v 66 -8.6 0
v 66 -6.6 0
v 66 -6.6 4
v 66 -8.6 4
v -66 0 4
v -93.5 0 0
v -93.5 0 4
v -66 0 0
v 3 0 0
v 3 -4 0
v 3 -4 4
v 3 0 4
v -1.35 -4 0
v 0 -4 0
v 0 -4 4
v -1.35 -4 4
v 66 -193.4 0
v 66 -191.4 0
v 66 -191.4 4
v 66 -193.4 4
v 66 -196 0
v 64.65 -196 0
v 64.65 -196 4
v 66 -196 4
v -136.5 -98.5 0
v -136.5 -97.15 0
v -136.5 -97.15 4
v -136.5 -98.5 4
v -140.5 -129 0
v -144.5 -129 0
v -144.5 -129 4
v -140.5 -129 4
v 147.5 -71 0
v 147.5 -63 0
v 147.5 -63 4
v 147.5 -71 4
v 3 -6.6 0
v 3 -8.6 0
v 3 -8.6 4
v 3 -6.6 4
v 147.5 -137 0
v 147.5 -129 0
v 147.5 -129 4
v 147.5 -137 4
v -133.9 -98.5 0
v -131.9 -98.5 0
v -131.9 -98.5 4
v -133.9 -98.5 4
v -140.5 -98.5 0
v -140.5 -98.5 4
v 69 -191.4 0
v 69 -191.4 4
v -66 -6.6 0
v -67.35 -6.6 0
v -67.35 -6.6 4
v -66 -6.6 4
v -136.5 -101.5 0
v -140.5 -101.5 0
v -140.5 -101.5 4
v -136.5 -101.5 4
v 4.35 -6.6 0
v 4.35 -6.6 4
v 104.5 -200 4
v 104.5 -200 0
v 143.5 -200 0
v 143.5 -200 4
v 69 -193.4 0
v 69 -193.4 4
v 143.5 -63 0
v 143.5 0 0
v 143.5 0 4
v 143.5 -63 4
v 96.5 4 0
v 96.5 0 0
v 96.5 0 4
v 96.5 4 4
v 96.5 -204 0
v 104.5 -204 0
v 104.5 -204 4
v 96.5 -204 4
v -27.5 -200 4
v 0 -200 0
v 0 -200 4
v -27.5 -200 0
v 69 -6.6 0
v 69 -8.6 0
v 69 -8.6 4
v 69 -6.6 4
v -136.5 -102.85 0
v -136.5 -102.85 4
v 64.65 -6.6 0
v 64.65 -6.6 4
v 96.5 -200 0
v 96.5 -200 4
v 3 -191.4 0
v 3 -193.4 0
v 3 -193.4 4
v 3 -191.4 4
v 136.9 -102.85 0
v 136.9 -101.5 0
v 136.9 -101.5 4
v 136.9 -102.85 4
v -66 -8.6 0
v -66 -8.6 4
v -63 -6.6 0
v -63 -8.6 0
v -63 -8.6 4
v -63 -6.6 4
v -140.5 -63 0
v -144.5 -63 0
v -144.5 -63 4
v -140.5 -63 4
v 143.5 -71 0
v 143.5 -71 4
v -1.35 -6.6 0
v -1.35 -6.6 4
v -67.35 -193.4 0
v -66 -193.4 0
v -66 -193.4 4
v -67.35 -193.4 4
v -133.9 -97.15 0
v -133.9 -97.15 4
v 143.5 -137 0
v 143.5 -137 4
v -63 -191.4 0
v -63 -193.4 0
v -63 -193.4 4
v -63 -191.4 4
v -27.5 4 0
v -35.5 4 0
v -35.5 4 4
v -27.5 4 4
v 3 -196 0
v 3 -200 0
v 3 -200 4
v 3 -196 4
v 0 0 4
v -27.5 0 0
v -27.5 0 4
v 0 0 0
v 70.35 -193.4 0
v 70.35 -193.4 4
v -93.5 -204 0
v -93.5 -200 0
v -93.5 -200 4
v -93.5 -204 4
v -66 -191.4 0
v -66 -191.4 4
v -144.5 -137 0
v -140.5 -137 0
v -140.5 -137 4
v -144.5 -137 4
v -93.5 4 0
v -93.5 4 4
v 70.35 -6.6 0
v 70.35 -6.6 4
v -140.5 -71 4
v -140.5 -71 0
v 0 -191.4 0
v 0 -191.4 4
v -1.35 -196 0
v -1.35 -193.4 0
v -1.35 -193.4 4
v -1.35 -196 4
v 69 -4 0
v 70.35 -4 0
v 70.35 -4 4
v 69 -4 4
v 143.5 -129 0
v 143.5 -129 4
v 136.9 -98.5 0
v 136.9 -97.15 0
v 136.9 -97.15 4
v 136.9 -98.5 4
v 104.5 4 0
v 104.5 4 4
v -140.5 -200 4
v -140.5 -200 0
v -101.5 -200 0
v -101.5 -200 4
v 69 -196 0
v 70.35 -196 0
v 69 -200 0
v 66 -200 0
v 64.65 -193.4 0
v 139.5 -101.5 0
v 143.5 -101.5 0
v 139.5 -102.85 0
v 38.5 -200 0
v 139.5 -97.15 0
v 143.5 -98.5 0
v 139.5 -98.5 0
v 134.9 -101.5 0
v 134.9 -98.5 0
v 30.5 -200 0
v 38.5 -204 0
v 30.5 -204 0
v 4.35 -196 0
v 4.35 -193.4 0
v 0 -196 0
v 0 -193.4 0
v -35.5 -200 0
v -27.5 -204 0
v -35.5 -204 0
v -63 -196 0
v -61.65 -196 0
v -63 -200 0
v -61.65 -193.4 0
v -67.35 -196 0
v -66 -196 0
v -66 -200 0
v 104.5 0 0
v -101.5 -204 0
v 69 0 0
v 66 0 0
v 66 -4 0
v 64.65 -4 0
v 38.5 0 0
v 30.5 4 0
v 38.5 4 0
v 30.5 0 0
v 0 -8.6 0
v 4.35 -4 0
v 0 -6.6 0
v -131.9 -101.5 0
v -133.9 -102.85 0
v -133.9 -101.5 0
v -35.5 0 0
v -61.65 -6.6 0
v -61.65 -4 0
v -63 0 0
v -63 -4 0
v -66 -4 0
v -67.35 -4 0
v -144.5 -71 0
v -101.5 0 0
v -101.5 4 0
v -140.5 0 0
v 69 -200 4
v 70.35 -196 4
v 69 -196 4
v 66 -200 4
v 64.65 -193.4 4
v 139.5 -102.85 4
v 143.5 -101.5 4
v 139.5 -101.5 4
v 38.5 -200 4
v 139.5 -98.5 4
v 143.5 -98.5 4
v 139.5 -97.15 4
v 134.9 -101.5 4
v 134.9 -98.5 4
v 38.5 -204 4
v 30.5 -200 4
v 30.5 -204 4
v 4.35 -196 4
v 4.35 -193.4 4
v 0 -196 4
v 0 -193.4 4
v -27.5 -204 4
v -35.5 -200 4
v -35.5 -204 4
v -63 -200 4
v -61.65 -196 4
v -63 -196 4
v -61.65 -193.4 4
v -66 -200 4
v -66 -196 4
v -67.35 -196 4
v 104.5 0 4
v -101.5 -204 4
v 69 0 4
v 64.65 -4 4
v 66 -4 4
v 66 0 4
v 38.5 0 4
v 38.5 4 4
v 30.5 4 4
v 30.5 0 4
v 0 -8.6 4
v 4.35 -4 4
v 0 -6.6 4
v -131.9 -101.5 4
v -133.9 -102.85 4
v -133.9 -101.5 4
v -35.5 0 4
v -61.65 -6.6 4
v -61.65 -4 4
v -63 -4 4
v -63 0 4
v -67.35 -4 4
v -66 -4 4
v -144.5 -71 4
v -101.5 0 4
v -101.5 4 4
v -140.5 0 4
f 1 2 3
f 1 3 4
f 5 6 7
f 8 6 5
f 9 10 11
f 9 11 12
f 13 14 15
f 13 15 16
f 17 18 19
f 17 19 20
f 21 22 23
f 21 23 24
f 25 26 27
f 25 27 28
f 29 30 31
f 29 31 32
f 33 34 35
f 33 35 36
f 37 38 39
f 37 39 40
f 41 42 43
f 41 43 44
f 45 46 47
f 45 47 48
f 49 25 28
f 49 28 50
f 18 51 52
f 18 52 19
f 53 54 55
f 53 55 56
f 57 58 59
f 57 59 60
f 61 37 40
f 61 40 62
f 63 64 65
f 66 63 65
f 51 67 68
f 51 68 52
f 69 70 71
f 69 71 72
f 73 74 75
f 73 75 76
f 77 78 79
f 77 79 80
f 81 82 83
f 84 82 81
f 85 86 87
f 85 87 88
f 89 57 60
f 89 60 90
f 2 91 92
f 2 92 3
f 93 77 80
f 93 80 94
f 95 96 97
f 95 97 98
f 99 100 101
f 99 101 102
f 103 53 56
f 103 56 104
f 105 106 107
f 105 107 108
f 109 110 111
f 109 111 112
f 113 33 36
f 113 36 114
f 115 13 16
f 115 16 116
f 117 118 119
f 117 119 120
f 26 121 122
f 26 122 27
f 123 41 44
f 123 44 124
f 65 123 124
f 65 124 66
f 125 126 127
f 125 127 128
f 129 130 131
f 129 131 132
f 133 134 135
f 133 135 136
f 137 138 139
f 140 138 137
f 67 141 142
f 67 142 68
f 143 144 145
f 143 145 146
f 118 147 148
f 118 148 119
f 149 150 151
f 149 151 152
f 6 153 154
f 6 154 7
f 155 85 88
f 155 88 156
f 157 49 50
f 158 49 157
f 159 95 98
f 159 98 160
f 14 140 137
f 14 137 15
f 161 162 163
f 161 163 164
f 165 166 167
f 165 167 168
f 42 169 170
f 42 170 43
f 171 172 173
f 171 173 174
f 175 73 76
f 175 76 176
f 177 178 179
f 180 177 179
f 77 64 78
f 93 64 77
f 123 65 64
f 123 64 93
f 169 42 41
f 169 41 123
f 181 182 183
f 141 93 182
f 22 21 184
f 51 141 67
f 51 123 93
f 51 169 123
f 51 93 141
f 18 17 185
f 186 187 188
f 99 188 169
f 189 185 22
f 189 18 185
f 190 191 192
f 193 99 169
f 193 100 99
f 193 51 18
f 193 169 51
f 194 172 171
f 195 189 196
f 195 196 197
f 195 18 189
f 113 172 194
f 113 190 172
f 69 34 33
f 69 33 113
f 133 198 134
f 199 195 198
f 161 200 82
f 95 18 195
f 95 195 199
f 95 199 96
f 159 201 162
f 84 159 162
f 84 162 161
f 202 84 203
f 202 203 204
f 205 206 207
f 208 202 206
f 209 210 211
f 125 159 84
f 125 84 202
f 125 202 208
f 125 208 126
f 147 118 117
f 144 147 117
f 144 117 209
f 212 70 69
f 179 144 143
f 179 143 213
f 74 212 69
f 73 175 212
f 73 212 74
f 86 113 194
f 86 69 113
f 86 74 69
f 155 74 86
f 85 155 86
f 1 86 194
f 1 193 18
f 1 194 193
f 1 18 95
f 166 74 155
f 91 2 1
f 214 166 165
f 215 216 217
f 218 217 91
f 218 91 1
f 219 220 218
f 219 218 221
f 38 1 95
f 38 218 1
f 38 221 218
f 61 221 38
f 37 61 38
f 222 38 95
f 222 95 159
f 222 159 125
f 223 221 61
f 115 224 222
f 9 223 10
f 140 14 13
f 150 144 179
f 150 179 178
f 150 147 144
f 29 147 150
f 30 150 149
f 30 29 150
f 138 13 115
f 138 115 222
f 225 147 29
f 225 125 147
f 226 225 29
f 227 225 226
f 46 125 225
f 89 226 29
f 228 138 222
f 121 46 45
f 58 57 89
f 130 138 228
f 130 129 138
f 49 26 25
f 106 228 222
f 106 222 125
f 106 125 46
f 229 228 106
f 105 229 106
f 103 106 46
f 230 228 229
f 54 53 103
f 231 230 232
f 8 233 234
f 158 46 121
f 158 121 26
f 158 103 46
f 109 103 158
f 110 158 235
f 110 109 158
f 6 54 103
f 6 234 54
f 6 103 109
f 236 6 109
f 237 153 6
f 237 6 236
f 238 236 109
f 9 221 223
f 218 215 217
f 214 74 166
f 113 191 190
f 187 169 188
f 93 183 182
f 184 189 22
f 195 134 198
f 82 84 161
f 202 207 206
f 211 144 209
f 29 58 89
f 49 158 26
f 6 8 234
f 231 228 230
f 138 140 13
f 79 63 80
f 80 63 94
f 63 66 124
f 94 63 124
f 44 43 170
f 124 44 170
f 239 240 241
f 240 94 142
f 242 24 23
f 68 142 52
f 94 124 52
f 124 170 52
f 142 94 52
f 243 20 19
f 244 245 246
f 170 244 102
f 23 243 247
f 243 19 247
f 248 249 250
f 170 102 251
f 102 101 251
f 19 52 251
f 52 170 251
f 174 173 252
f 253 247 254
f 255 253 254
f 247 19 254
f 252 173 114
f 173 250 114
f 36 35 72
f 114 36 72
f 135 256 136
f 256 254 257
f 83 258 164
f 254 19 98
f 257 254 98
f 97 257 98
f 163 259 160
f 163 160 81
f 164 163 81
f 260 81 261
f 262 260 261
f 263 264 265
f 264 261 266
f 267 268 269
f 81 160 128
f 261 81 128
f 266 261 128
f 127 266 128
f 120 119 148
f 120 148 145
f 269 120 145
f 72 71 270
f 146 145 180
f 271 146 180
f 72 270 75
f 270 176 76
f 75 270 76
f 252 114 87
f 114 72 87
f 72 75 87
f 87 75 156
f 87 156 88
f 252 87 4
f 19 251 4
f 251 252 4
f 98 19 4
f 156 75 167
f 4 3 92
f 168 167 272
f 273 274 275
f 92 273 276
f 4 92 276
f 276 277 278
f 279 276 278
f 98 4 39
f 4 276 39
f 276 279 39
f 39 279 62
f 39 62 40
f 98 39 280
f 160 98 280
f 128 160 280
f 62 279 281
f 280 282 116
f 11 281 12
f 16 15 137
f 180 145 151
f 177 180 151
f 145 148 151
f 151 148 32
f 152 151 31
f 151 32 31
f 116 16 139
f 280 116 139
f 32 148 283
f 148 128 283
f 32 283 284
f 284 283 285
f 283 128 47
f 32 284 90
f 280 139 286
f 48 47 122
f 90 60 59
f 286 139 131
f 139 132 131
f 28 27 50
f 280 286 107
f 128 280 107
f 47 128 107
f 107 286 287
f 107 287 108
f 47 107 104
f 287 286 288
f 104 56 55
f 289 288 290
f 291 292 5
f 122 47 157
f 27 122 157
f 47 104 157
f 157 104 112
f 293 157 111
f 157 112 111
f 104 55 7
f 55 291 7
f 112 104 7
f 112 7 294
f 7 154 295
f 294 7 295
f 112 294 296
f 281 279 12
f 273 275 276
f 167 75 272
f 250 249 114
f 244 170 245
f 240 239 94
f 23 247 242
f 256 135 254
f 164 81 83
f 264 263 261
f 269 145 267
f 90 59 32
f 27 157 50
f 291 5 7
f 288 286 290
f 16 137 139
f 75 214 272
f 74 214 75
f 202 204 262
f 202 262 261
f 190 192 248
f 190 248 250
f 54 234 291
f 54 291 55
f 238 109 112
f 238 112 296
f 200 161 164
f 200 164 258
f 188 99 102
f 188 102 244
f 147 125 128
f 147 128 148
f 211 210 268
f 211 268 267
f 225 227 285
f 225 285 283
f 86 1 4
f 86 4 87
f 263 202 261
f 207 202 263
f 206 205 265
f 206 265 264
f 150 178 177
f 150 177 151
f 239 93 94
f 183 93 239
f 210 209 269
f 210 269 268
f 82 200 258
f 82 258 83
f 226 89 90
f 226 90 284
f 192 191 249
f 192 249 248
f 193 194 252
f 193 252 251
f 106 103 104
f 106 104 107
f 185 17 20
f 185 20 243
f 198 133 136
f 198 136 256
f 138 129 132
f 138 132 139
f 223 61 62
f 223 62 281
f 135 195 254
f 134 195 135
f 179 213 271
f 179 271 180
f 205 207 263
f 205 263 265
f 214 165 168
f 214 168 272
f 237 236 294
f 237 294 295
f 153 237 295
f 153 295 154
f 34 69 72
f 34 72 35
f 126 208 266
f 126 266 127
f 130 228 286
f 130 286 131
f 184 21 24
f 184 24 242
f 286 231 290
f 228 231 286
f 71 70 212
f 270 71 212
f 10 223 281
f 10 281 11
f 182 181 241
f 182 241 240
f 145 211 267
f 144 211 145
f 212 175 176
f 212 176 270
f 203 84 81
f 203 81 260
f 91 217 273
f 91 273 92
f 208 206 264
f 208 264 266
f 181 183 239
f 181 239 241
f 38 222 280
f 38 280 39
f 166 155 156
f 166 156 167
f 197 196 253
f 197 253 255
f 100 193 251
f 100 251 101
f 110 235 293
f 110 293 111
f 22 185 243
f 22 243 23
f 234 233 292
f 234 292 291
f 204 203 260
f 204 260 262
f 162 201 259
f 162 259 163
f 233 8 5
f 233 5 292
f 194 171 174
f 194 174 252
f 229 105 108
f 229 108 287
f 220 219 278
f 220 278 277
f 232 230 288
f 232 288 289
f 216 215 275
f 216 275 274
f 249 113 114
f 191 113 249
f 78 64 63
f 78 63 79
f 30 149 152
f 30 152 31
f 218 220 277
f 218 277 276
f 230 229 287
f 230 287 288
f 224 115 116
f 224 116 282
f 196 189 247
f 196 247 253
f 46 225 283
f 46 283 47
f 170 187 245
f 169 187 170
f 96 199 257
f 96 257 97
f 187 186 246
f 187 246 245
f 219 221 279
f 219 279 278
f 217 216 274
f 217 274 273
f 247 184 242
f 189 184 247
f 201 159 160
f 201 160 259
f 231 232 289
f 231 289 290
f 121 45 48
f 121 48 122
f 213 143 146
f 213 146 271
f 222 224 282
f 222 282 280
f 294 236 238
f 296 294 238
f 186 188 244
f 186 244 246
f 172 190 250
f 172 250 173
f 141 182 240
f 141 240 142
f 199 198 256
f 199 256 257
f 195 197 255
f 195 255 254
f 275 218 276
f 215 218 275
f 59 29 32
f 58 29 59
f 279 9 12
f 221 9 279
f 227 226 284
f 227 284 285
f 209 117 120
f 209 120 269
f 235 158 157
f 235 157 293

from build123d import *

# Parameters (mm, degrees)
EXTRUDE_1_DEPTH = 4


with BuildPart() as part:
    # 草图1 → 凸台-拉伸1 (new body)
    with BuildSketch(Plane.XY):
        Polygon((0, 0), (0, -4), (-1.35, -4), (-1.35, -6.6), (0, -6.6), (0, -8.6), (3, -8.6), (3, -6.6), (4.35, -6.6), (4.35, -4), (3, -4), (3, 0), (30.5, 0), (30.5, 4), (38.5, 4), (38.5, 0), (66, 0), (66, -4), (64.65, -4), (64.65, -6.6), (66, -6.6), (66, -8.6), (69, -8.6), (69, -6.6), (70.35, -6.6), (70.35, -4), (69, -4), (69, 0), (96.5, 0), (96.5, 4), (104.5, 4), (104.5, 0), (132, 0), (143.5, 0), (143.5, -63), (147.5, -63), (147.5, -71), (143.5, -71), (143.5, -98.5), (139.5, -98.5), (139.5, -97.15), (136.9, -97.15), (136.9, -98.5), (134.9, -98.5), (134.9, -101.5), (136.9, -101.5), (136.9, -102.85), (139.5, -102.85), (139.5, -101.5), (143.5, -101.5), (143.5, -129), (147.5, -129), (147.5, -137), (143.5, -137), (143.5, -200), (132, -200), (104.5, -200), (104.5, -204), (96.5, -204), (96.5, -200), (69, -200), (69, -196), (70.35, -196), (70.35, -193.4), (69, -193.4), (69, -191.4), (66, -191.4), (66, -193.4), (64.65, -193.4), (64.65, -196), (66, -196), (66, -200), (38.5, -200), (38.5, -204), (30.5, -204), (30.5, -200), (3, -200), (3, -196), (4.35, -196), (4.35, -193.4), (3, -193.4), (3, -191.4), (0, -191.4), (0, -193.4), (-1.35, -193.4), (-1.35, -196), (0, -196), (0, -200), (-27.5, -200), (-27.5, -204), (-35.5, -204), (-35.5, -200), (-63, -200), (-63, -196), (-61.65, -196), (-61.65, -193.4), (-63, -193.4), (-63, -191.4), (-66, -191.4), (-66, -193.4), (-67.35, -193.4), (-67.35, -196), (-66, -196), (-66, -200), (-93.5, -200), (-93.5, -204), (-101.5, -204), (-101.5, -200), (-129, -200), (-140.5, -200), (-140.5, -137), (-144.5, -137), (-144.5, -129), (-140.5, -129), (-140.5, -101.5), (-136.5, -101.5), (-136.5, -102.85), (-133.9, -102.85), (-133.9, -101.5), (-131.9, -101.5), (-131.9, -98.5), (-133.9, -98.5), (-133.9, -97.15), (-136.5, -97.15), (-136.5, -98.5), (-140.5, -98.5), (-140.5, -71), (-144.5, -71), (-144.5, -63), (-140.5, -63), (-140.5, 0), (-129, 0), (-101.5, 0), (-101.5, 4), (-93.5, 4), (-93.5, 0), (-66, 0), (-66, -4), (-67.35, -4), (-67.35, -6.6), (-66, -6.6), (-66, -8.6), (-63, -8.6), (-63, -6.6), (-61.65, -6.6), (-61.65, -4), (-63, -4), (-63, 0), (-35.5, 0), (-35.5, 4), (-27.5, 4), (-27.5, 0), align=None)
    extrude(amount=EXTRUDE_1_DEPTH)


solid = part.part
